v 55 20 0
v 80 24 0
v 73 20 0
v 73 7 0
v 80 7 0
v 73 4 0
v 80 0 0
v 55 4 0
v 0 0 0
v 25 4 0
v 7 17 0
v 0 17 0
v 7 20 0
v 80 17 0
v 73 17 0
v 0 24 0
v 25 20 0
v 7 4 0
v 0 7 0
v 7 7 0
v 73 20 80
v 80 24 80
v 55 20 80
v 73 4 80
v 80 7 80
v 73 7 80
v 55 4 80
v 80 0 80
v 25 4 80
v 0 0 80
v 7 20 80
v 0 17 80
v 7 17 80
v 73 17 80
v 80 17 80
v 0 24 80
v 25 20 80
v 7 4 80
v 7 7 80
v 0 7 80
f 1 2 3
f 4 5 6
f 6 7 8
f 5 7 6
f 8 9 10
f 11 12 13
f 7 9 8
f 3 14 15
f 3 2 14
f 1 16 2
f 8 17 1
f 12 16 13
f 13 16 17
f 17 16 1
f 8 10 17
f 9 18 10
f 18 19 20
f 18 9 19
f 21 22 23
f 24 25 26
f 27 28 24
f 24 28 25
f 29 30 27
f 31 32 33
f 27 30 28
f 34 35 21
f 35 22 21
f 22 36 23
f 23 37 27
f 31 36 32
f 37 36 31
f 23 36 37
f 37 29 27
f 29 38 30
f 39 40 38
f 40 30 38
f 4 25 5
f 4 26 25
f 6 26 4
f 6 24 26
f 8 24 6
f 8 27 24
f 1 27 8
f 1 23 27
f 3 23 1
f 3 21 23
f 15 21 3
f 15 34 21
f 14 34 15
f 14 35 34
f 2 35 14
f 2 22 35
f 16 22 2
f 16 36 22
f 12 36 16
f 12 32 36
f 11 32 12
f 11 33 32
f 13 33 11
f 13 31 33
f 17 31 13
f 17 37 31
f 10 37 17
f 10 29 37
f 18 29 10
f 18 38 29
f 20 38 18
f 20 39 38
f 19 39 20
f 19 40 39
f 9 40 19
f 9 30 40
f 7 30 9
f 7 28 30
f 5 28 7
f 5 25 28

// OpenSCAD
$fn = 32;

// ----------------------------------------------------------------------
// T-slot rail: 80 x 24 mm section, 80 mm long
// ----------------------------------------------------------------------

// --- parameters (mm) ---
profile_height = 80;      // extrusion height
profile_points = 20;      // points of the closed outline

profile = [[0, 0], [80, 0], [80, 7], [73, 7], [73, 4], [55, 4], [55, 20], [73, 20], [73, 17], [80, 17], [80, 24], [0, 24], [0, 17], [7, 17], [7, 20], [25, 20], [25, 4], [7, 4], [7, 7], [0, 7]];  // single closed polygon, 20 points, counter clockwise

// --- the one profile operation ---
linear_extrude(height = profile_height) polygon(points = profile);
